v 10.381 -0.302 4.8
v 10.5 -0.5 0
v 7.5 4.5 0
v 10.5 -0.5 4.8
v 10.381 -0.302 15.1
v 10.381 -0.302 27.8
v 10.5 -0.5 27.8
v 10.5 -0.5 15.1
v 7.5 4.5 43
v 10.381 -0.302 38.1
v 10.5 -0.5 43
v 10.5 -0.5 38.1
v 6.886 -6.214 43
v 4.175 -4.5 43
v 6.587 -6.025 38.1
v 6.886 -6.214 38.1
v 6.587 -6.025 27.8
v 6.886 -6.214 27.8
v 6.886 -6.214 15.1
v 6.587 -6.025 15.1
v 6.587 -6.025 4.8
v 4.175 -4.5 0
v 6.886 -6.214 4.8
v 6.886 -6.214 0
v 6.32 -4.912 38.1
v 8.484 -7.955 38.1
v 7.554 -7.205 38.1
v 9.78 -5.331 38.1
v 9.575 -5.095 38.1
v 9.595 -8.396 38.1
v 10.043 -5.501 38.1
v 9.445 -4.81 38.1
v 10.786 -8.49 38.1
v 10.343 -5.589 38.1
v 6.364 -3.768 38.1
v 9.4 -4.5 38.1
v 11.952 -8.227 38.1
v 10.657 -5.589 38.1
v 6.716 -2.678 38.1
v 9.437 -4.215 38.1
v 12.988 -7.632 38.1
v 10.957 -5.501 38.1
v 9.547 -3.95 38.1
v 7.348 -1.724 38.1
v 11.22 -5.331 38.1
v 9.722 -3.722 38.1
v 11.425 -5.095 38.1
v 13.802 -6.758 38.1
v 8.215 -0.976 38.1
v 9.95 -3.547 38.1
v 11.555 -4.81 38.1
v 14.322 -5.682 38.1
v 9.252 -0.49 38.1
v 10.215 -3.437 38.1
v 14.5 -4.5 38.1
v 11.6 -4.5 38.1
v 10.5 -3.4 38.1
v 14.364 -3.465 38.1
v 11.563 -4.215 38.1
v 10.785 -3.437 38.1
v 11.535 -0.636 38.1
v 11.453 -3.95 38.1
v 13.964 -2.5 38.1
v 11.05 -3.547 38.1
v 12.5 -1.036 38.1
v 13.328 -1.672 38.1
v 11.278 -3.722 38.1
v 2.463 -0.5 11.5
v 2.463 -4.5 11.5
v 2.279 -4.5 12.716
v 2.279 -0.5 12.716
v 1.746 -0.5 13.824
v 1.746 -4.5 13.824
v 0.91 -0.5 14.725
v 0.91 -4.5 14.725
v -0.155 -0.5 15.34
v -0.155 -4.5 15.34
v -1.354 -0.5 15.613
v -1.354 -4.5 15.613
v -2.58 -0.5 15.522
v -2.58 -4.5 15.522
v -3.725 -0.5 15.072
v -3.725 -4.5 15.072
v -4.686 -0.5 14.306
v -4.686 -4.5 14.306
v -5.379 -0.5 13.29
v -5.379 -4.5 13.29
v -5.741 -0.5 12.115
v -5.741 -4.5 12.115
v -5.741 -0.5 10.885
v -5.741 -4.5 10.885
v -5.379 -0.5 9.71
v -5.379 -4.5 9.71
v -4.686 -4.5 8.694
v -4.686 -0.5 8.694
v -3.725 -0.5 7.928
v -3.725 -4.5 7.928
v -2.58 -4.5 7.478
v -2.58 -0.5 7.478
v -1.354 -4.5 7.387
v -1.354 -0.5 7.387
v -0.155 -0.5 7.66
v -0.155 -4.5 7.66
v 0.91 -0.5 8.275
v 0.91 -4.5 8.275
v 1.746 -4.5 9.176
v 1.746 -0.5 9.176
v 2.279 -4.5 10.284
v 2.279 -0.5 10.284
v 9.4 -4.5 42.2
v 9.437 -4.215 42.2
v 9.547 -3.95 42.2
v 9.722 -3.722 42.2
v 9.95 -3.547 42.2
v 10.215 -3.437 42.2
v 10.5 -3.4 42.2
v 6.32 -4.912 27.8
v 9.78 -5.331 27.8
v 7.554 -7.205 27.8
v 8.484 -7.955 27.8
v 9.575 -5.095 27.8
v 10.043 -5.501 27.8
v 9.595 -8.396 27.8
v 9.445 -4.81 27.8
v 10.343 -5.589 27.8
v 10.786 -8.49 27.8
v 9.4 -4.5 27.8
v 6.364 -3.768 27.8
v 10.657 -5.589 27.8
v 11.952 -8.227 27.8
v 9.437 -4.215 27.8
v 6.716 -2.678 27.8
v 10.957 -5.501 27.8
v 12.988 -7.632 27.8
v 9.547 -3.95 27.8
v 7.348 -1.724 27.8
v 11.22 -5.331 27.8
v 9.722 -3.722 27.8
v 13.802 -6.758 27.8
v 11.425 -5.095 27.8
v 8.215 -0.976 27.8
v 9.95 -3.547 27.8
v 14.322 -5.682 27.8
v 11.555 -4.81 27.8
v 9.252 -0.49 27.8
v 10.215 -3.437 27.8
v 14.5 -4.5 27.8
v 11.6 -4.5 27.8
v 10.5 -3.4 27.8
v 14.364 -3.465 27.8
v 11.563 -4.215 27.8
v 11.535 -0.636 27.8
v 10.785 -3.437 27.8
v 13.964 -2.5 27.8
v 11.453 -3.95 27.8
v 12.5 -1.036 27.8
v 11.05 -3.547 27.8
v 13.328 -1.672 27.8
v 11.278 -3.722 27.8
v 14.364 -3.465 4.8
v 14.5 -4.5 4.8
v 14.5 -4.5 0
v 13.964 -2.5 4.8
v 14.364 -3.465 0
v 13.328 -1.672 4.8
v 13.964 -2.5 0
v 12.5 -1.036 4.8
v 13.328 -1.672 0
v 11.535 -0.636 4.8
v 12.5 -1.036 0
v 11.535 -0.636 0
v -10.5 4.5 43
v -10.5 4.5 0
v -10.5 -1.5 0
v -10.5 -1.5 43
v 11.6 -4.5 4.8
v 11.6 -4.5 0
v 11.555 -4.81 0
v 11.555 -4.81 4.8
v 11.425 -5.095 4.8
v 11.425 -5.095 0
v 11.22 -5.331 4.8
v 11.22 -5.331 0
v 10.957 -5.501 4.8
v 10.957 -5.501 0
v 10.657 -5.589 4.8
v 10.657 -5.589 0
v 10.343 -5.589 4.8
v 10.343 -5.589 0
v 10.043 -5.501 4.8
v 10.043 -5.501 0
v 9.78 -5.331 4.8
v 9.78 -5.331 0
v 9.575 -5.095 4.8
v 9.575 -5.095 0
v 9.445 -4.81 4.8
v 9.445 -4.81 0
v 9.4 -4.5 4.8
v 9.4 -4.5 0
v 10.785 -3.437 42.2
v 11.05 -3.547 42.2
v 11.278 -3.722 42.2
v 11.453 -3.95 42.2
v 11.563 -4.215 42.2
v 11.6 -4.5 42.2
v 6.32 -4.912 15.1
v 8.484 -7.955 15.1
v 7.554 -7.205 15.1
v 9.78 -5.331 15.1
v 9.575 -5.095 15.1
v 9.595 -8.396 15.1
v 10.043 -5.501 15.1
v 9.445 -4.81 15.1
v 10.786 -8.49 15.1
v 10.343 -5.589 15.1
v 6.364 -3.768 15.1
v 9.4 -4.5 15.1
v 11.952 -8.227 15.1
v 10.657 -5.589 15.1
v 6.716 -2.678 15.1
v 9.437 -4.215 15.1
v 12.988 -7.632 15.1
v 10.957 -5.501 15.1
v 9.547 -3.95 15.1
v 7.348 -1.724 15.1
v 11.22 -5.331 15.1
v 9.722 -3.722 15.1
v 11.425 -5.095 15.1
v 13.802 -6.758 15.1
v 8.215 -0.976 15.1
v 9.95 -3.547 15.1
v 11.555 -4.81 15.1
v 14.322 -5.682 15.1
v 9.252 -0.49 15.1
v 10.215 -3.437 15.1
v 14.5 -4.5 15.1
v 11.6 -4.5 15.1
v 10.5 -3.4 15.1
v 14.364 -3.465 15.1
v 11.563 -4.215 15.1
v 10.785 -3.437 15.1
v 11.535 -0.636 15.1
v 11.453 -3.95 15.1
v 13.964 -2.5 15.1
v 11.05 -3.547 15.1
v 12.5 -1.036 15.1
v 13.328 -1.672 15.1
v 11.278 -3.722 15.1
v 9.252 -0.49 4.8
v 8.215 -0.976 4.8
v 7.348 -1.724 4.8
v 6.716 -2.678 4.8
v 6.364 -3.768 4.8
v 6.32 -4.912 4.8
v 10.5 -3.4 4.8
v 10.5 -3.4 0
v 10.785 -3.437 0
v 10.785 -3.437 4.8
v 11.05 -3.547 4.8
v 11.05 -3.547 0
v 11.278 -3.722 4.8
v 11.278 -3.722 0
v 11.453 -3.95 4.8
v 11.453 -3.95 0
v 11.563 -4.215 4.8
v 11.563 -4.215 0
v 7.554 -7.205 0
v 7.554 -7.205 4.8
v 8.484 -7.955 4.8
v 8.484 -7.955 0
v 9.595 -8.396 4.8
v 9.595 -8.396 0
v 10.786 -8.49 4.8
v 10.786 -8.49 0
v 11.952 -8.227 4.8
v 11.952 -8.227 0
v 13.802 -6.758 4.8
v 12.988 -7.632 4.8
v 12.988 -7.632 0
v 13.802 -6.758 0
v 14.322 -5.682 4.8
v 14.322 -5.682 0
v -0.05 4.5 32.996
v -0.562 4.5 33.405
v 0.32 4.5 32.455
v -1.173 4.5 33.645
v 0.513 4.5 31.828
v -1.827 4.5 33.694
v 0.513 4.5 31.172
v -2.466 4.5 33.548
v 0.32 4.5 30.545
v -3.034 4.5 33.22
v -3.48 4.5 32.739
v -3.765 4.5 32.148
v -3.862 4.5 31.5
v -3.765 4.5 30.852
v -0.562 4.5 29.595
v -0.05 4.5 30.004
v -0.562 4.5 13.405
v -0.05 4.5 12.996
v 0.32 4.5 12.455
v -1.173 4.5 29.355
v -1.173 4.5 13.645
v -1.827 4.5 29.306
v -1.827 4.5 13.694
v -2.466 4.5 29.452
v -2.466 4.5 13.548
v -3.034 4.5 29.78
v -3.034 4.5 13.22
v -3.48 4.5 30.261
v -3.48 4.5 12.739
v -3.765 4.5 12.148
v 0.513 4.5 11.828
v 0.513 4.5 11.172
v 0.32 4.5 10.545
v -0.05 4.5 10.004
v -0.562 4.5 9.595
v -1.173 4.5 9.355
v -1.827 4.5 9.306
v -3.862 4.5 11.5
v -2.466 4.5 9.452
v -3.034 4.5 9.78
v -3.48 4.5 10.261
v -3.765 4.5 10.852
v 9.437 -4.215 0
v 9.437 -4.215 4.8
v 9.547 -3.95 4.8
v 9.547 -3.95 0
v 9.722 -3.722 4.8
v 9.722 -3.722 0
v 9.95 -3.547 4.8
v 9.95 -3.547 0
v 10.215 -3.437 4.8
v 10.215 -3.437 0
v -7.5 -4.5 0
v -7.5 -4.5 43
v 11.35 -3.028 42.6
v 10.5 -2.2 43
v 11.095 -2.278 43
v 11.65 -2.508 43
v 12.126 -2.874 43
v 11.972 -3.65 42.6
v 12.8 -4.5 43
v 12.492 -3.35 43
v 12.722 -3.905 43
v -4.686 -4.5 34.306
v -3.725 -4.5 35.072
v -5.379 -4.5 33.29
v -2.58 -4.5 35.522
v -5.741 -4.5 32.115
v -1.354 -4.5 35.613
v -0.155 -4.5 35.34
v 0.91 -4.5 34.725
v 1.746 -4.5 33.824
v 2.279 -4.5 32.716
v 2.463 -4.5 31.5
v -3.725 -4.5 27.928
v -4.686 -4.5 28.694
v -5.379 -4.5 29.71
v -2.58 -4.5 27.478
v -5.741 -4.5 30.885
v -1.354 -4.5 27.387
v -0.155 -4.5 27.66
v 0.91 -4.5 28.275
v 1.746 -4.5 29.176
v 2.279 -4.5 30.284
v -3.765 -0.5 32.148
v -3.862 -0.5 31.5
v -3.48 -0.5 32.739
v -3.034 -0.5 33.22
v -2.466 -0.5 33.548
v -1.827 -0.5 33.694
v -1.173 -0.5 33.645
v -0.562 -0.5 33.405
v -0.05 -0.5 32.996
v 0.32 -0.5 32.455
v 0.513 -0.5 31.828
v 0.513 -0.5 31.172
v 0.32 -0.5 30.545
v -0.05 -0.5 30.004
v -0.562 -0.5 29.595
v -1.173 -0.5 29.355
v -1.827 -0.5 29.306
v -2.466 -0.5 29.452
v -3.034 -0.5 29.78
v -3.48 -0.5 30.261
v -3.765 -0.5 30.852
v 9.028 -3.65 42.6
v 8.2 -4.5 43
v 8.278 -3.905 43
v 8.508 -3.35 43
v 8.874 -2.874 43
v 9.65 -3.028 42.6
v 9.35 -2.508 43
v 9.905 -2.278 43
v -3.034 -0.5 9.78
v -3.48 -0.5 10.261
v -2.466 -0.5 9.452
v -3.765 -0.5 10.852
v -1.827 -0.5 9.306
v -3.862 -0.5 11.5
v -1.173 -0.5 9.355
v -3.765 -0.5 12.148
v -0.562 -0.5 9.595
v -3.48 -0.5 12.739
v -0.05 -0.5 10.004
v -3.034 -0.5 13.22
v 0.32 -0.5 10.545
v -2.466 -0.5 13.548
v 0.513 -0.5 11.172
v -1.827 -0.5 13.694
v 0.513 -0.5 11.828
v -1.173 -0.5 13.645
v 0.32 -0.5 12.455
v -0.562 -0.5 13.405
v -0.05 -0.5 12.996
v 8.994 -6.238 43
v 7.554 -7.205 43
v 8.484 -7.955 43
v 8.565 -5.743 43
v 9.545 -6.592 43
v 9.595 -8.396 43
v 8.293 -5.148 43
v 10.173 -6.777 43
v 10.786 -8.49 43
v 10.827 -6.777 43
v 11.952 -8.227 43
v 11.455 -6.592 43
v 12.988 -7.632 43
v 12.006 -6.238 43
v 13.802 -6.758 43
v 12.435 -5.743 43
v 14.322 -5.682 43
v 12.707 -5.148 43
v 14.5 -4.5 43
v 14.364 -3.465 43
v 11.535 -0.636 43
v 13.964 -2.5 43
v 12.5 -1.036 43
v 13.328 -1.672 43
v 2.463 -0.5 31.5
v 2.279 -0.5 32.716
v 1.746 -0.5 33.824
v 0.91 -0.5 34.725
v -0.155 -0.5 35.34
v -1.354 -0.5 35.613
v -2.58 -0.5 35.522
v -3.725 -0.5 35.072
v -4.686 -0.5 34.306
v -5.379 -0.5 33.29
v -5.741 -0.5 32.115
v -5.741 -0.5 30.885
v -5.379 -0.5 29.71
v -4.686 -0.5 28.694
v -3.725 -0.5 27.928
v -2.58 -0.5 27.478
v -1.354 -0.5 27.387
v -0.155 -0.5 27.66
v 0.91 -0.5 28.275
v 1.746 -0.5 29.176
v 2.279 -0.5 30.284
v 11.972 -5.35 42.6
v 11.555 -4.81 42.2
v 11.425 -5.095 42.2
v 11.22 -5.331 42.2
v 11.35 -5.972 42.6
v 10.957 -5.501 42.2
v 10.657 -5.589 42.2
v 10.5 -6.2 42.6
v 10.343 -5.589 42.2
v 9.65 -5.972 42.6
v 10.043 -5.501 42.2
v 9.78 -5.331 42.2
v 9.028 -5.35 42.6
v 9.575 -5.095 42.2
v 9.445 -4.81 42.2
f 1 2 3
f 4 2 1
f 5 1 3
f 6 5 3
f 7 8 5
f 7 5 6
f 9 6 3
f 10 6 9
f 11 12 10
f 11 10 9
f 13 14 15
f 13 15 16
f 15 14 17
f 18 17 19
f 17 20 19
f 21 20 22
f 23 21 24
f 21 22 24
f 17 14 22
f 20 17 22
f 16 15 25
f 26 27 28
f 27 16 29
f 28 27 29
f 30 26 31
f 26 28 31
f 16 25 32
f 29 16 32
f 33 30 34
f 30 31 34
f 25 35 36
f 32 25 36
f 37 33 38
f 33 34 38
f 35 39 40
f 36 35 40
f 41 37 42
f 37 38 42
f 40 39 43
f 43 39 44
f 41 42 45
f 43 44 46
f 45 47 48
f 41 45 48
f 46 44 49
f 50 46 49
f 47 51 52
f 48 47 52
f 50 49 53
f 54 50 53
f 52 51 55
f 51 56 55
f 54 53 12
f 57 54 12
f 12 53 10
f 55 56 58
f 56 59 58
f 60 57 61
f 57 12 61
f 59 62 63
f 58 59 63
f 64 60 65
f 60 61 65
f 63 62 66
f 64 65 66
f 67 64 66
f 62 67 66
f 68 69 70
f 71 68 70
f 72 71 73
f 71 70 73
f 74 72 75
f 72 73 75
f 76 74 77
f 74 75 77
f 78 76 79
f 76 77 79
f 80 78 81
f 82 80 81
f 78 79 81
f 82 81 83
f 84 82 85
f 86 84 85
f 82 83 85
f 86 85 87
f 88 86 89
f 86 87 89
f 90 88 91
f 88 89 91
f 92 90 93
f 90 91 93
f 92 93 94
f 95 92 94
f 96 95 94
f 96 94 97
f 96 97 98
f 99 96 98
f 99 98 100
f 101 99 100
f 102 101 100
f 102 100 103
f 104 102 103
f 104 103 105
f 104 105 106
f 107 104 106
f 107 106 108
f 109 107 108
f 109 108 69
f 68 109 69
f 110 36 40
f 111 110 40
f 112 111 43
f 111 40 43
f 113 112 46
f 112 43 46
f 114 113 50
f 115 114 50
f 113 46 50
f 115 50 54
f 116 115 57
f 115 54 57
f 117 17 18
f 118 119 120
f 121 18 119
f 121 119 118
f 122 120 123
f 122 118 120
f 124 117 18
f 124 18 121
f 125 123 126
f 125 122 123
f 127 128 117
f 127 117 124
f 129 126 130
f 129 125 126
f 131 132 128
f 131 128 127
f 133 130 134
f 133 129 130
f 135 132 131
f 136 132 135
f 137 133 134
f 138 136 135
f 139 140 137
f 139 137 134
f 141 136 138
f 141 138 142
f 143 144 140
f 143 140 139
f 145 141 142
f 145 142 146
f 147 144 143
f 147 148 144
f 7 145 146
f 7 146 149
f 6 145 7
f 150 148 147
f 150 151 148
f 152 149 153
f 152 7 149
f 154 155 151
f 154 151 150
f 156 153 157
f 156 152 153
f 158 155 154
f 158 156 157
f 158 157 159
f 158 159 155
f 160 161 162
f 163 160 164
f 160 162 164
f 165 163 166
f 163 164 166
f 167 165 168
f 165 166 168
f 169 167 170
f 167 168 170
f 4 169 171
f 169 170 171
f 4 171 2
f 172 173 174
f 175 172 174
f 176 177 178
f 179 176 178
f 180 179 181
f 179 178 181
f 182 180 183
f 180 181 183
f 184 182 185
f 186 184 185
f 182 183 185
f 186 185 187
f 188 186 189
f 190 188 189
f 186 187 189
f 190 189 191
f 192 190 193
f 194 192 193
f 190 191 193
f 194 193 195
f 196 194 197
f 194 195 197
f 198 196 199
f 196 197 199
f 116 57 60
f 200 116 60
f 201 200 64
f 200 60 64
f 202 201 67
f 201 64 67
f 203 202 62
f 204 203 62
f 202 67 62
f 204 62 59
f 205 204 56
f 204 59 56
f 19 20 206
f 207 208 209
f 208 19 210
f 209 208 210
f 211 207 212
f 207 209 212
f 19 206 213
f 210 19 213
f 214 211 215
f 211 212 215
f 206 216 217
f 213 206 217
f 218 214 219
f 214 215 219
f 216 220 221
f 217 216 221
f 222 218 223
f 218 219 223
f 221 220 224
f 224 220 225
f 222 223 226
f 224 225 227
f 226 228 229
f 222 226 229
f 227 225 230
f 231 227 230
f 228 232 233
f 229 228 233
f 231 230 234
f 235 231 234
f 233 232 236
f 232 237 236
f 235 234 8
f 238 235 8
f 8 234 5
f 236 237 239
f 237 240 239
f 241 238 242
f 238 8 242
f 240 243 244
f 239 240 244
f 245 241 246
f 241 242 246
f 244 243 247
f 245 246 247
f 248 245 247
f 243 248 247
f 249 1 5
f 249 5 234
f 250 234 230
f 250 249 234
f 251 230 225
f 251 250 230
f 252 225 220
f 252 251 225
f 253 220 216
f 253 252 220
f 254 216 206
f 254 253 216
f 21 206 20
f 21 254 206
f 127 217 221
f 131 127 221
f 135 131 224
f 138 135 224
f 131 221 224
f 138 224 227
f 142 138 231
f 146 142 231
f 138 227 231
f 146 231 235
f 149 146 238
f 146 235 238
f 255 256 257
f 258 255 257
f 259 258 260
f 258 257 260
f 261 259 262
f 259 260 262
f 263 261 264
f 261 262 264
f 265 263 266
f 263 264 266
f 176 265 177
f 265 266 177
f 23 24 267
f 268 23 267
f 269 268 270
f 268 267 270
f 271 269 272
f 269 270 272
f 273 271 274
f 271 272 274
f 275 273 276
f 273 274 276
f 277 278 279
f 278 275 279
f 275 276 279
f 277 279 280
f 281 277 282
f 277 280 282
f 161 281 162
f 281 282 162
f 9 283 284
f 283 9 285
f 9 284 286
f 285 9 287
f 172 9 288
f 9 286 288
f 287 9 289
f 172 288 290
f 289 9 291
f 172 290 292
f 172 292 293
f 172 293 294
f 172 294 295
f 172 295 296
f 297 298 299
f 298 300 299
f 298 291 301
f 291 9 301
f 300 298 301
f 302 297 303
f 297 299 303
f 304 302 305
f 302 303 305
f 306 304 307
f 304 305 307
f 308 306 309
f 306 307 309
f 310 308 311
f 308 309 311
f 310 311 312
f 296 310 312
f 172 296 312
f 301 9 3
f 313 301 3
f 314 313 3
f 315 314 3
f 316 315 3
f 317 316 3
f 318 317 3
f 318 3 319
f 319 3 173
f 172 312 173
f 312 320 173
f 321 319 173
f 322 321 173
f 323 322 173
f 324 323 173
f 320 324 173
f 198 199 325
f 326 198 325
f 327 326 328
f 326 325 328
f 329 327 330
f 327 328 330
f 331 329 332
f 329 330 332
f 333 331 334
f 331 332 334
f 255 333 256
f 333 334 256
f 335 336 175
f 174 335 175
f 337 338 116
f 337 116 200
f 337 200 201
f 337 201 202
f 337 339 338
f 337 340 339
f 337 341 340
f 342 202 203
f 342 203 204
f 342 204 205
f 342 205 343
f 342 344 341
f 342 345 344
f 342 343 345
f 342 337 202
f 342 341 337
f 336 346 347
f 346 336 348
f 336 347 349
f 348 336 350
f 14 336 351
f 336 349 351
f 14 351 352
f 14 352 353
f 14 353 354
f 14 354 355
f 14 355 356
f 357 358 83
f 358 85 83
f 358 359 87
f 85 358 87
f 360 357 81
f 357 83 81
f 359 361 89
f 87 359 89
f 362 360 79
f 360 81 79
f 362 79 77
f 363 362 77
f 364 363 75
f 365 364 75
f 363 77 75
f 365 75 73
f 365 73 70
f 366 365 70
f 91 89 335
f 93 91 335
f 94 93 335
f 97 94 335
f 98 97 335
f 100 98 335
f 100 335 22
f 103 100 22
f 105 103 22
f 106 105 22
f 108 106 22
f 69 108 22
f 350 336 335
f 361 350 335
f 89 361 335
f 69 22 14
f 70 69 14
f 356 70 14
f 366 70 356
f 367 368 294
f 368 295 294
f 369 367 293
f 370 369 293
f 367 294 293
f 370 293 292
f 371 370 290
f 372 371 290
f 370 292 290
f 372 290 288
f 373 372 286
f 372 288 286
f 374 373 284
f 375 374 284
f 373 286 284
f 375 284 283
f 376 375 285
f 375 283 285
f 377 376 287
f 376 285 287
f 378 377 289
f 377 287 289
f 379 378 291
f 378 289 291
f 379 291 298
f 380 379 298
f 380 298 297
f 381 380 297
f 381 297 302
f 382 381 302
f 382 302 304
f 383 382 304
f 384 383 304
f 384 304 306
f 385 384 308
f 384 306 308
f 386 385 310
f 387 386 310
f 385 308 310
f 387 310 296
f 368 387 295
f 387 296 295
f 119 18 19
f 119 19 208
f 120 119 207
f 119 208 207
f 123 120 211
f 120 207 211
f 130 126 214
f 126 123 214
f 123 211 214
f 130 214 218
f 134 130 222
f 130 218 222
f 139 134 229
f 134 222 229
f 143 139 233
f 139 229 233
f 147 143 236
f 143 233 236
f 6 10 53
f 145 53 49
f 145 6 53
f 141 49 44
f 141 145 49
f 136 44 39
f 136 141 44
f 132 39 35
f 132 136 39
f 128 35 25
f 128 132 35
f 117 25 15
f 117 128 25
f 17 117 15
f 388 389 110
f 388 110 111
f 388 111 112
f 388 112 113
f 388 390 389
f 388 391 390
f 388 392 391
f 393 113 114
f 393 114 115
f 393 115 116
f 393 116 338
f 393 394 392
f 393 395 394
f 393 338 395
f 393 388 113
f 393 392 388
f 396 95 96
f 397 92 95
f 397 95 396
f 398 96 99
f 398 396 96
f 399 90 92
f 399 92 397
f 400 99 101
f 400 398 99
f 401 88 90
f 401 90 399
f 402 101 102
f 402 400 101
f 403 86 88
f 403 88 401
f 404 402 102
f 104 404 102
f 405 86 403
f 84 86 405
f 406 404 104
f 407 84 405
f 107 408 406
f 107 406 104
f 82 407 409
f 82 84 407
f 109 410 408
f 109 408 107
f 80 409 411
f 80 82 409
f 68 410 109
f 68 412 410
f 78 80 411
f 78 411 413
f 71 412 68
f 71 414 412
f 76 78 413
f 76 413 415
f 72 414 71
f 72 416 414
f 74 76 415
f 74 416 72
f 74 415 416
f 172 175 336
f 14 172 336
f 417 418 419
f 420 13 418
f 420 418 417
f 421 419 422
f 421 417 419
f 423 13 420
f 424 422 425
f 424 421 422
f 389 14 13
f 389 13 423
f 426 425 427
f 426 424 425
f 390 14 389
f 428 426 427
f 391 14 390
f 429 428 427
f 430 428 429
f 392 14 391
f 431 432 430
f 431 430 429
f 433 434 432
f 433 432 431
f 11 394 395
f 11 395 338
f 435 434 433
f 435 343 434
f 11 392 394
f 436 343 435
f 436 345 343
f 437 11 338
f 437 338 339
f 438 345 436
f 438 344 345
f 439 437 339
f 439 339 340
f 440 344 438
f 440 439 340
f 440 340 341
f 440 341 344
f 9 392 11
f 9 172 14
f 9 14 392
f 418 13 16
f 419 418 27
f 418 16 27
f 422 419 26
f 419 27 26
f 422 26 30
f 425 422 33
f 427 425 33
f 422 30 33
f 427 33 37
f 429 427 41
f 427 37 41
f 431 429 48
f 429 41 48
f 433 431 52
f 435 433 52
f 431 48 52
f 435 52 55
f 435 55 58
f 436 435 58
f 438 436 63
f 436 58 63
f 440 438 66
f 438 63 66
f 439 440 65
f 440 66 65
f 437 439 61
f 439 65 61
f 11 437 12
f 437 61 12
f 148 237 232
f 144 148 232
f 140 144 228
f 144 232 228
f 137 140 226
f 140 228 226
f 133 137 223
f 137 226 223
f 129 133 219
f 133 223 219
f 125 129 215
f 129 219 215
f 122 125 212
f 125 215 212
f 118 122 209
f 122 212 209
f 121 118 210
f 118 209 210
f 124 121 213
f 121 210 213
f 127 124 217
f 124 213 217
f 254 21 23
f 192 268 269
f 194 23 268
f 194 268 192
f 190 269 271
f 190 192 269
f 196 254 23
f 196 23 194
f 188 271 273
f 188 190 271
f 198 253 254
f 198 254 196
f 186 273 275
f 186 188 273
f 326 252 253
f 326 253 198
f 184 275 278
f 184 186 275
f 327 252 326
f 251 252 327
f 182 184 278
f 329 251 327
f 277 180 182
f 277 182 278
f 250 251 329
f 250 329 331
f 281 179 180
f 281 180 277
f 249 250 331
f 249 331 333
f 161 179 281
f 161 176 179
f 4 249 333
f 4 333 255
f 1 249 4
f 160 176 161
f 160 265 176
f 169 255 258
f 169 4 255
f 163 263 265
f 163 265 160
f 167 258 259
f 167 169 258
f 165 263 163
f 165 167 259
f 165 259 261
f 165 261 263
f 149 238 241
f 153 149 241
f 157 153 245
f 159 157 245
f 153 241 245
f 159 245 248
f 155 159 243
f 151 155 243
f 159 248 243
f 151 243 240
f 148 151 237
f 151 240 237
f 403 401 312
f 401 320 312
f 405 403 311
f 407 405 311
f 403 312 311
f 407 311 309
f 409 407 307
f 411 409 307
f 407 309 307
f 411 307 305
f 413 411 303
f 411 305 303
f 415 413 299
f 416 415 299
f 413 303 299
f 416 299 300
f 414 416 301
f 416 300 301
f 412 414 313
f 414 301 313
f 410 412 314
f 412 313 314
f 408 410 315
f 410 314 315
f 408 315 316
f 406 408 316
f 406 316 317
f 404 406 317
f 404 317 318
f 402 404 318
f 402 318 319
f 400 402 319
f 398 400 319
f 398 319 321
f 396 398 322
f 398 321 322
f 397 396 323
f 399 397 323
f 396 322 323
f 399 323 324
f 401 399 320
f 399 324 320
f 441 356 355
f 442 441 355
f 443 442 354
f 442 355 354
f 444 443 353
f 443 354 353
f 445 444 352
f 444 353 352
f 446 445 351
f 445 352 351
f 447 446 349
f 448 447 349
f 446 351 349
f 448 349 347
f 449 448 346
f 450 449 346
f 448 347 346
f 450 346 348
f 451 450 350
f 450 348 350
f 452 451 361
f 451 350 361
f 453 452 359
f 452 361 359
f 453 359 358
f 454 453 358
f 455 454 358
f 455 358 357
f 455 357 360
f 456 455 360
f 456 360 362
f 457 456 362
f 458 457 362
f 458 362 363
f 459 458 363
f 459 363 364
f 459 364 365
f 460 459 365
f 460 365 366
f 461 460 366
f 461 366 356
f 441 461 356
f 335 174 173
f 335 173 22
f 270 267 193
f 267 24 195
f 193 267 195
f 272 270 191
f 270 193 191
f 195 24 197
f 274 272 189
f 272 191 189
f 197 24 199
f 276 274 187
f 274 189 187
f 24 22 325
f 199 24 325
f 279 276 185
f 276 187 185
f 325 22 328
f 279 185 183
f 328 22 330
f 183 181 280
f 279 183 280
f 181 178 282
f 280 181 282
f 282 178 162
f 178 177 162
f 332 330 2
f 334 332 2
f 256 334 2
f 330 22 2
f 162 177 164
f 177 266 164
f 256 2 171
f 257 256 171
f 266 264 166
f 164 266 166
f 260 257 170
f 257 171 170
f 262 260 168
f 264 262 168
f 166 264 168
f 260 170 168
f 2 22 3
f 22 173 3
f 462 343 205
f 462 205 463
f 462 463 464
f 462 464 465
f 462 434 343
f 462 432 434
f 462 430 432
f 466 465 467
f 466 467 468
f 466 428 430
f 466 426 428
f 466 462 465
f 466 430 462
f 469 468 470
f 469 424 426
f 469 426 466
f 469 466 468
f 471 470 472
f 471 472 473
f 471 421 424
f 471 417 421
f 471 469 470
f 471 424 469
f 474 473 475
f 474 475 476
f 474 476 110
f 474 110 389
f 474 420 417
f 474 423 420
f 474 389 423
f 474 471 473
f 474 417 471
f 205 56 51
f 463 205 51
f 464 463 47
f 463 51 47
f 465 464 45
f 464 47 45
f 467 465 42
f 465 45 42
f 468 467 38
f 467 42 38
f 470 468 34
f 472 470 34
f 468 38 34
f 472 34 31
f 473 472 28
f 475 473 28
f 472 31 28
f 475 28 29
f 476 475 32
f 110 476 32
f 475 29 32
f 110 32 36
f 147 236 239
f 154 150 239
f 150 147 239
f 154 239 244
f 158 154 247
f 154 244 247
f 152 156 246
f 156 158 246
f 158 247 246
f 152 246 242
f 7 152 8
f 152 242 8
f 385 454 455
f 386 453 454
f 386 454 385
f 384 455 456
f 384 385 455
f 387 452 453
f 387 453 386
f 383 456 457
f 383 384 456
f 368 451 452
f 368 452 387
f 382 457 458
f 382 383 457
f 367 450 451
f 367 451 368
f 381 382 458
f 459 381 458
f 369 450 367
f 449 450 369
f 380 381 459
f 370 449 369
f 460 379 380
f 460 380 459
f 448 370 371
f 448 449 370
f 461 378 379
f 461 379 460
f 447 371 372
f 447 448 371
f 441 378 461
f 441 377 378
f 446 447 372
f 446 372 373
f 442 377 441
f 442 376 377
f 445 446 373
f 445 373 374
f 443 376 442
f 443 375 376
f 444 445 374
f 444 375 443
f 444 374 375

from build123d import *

# Parameters (mm, degrees)
F1_DEPTH       = 43
F2_T1_DEPTH    = 43
F2_T3_DEPTH    = 58.4300979278
F4_D           = 4.4
F4_CBORE_D     = 8.25
F4_CBORE_DEPTH = 4
F5_SIZE2       = 4.99999
F5_SIZE        = 2.99999
F7_START       = 4.8
F6_R           = 4.2
F7_DEPTH       = 10.3
F8_START       = 27.8
F8_DEPTH       = 10.3
F9_SIZE2       = 1.2
F9_SIZE        = 0.8


# Not quite as in the source:
# - a fillet or chamfer that OpenCascade refuses, or shapes differently, is made with other operations: its cross-section is extruded or revolved along the edge and cut away or added
# - a fillet or chamfer is up to 0.001 mm smaller than in the source, because OpenCascade refuses the exact size


with BuildPart() as f1:
    # F0 (on Top) → F1 (new body)
    with BuildSketch(Plane.XY):
        with BuildLine():
            Line((-10.5, -4.5), (6.5, -4.5))
            ThreePointArc((6.5, -4.5), (7.6715728753, -1.6715728753), (10.5, -0.5))
            Line((10.5, -0.5), (10.5, 4.5))
            Line((10.5, 4.5), (-10.5, 4.5))
            Line((-10.5, 4.5), (-10.5, -4.5))
        make_face()
        with BuildLine():
            Line((6.5, -4.5), (9.4, -4.5))
            ThreePointArc((9.4, -4.5), (9.7221825407, -3.7221825407), (10.5, -3.4))
            Line((10.5, -3.4), (10.5, -0.5))
            ThreePointArc((10.5, -0.5), (7.6715728753, -1.6715728753), (6.5, -4.5))
        make_face()
        with BuildLine():
            ThreePointArc((11.6, -4.5), (10.5, -5.6), (9.4, -4.5))
            Line((9.4, -4.5), (6.5, -4.5))
            ThreePointArc((6.5, -4.5), (10.5, -8.5), (14.5, -4.5))
            ThreePointArc((14.5, -4.5), (13.3284271247, -1.6715728753), (10.5, -0.5))
            Line((10.5, -0.5), (10.5, -3.4))
            ThreePointArc((10.5, -3.4), (11.2778174593, -3.7221825407), (11.6, -4.5))
        make_face()
    extrude(amount=F1_DEPTH)

    # F2: chamfer of 3 on 2 edges, made by hand

    # F2_s2 → F2_t1 (join)
    with BuildSketch(Plane.XY):
        with BuildLine():
            Line((4.1754446797, -4.5), (6.8859683884, -6.2142857143))
            ThreePointArc((6.8859683884, -6.2142857143), (6.6075772395, -5.4214364079), (6.5, -4.5))
            Line((6.5, -4.5), (4.1754446797, -4.5))
        make_face()
    extrude(amount=F2_T1_DEPTH)

    # F2_s4 → F2_t3 (cut)
    with BuildSketch(Plane.XY.offset(-7.7150489639)):
        Polygon((-7.5, -4.5), (-10.5, -1.5), (-10.5, -4.5), align=None)
    extrude(amount=F2_T3_DEPTH, mode=Mode.SUBTRACT)

    # F4 (through all)
    with Locations(Plane.XZ.offset(4.5)):
        with Locations((-1.6622776602, 31.5), (-1.6622776602, 11.5)):
            CounterBoreHole(F4_D / 2, F4_CBORE_D / 2, F4_CBORE_DEPTH)

    # F5 (size 3 and 5 in the source; OpenCascade refuses exactly that, so slightly less here)
    f5_edges = [f1.edges().sort_by_distance(p)[0] for p in [
        (10.5, 4.5, 21.5),
    ]]
    f5_side = f1.faces().sort_by_distance((0.057932, 4.5, 21.5))[0]
    chamfer(f5_edges, length=F5_SIZE, length2=F5_SIZE2, reference=f5_side)

    # F6 (on face) → F7 (cut)
    with BuildSketch(Plane.XY.offset(F7_START)):
        with Locations((10.5, -4.5)):
            Circle(F6_R)
    extrude(amount=F7_DEPTH, mode=Mode.SUBTRACT)

    # F6 (on face) → F8 (cut)
    with BuildSketch(Plane.XY.offset(F8_START)):
        with Locations((10.5, -4.5)):
            Circle(F6_R)
    extrude(amount=F8_DEPTH, mode=Mode.SUBTRACT)

    # F9
    f9_edges = [f1.edges().sort_by_distance(p)[0] for p in [
        (10.5, -5.6, 43),
    ]]
    f9_side = f1.faces().sort_by_distance((10.5, -5.6, 40.55))[0]
    chamfer(f9_edges, length=F9_SIZE, length2=F9_SIZE2, reference=f9_side)


solid = f1.part
